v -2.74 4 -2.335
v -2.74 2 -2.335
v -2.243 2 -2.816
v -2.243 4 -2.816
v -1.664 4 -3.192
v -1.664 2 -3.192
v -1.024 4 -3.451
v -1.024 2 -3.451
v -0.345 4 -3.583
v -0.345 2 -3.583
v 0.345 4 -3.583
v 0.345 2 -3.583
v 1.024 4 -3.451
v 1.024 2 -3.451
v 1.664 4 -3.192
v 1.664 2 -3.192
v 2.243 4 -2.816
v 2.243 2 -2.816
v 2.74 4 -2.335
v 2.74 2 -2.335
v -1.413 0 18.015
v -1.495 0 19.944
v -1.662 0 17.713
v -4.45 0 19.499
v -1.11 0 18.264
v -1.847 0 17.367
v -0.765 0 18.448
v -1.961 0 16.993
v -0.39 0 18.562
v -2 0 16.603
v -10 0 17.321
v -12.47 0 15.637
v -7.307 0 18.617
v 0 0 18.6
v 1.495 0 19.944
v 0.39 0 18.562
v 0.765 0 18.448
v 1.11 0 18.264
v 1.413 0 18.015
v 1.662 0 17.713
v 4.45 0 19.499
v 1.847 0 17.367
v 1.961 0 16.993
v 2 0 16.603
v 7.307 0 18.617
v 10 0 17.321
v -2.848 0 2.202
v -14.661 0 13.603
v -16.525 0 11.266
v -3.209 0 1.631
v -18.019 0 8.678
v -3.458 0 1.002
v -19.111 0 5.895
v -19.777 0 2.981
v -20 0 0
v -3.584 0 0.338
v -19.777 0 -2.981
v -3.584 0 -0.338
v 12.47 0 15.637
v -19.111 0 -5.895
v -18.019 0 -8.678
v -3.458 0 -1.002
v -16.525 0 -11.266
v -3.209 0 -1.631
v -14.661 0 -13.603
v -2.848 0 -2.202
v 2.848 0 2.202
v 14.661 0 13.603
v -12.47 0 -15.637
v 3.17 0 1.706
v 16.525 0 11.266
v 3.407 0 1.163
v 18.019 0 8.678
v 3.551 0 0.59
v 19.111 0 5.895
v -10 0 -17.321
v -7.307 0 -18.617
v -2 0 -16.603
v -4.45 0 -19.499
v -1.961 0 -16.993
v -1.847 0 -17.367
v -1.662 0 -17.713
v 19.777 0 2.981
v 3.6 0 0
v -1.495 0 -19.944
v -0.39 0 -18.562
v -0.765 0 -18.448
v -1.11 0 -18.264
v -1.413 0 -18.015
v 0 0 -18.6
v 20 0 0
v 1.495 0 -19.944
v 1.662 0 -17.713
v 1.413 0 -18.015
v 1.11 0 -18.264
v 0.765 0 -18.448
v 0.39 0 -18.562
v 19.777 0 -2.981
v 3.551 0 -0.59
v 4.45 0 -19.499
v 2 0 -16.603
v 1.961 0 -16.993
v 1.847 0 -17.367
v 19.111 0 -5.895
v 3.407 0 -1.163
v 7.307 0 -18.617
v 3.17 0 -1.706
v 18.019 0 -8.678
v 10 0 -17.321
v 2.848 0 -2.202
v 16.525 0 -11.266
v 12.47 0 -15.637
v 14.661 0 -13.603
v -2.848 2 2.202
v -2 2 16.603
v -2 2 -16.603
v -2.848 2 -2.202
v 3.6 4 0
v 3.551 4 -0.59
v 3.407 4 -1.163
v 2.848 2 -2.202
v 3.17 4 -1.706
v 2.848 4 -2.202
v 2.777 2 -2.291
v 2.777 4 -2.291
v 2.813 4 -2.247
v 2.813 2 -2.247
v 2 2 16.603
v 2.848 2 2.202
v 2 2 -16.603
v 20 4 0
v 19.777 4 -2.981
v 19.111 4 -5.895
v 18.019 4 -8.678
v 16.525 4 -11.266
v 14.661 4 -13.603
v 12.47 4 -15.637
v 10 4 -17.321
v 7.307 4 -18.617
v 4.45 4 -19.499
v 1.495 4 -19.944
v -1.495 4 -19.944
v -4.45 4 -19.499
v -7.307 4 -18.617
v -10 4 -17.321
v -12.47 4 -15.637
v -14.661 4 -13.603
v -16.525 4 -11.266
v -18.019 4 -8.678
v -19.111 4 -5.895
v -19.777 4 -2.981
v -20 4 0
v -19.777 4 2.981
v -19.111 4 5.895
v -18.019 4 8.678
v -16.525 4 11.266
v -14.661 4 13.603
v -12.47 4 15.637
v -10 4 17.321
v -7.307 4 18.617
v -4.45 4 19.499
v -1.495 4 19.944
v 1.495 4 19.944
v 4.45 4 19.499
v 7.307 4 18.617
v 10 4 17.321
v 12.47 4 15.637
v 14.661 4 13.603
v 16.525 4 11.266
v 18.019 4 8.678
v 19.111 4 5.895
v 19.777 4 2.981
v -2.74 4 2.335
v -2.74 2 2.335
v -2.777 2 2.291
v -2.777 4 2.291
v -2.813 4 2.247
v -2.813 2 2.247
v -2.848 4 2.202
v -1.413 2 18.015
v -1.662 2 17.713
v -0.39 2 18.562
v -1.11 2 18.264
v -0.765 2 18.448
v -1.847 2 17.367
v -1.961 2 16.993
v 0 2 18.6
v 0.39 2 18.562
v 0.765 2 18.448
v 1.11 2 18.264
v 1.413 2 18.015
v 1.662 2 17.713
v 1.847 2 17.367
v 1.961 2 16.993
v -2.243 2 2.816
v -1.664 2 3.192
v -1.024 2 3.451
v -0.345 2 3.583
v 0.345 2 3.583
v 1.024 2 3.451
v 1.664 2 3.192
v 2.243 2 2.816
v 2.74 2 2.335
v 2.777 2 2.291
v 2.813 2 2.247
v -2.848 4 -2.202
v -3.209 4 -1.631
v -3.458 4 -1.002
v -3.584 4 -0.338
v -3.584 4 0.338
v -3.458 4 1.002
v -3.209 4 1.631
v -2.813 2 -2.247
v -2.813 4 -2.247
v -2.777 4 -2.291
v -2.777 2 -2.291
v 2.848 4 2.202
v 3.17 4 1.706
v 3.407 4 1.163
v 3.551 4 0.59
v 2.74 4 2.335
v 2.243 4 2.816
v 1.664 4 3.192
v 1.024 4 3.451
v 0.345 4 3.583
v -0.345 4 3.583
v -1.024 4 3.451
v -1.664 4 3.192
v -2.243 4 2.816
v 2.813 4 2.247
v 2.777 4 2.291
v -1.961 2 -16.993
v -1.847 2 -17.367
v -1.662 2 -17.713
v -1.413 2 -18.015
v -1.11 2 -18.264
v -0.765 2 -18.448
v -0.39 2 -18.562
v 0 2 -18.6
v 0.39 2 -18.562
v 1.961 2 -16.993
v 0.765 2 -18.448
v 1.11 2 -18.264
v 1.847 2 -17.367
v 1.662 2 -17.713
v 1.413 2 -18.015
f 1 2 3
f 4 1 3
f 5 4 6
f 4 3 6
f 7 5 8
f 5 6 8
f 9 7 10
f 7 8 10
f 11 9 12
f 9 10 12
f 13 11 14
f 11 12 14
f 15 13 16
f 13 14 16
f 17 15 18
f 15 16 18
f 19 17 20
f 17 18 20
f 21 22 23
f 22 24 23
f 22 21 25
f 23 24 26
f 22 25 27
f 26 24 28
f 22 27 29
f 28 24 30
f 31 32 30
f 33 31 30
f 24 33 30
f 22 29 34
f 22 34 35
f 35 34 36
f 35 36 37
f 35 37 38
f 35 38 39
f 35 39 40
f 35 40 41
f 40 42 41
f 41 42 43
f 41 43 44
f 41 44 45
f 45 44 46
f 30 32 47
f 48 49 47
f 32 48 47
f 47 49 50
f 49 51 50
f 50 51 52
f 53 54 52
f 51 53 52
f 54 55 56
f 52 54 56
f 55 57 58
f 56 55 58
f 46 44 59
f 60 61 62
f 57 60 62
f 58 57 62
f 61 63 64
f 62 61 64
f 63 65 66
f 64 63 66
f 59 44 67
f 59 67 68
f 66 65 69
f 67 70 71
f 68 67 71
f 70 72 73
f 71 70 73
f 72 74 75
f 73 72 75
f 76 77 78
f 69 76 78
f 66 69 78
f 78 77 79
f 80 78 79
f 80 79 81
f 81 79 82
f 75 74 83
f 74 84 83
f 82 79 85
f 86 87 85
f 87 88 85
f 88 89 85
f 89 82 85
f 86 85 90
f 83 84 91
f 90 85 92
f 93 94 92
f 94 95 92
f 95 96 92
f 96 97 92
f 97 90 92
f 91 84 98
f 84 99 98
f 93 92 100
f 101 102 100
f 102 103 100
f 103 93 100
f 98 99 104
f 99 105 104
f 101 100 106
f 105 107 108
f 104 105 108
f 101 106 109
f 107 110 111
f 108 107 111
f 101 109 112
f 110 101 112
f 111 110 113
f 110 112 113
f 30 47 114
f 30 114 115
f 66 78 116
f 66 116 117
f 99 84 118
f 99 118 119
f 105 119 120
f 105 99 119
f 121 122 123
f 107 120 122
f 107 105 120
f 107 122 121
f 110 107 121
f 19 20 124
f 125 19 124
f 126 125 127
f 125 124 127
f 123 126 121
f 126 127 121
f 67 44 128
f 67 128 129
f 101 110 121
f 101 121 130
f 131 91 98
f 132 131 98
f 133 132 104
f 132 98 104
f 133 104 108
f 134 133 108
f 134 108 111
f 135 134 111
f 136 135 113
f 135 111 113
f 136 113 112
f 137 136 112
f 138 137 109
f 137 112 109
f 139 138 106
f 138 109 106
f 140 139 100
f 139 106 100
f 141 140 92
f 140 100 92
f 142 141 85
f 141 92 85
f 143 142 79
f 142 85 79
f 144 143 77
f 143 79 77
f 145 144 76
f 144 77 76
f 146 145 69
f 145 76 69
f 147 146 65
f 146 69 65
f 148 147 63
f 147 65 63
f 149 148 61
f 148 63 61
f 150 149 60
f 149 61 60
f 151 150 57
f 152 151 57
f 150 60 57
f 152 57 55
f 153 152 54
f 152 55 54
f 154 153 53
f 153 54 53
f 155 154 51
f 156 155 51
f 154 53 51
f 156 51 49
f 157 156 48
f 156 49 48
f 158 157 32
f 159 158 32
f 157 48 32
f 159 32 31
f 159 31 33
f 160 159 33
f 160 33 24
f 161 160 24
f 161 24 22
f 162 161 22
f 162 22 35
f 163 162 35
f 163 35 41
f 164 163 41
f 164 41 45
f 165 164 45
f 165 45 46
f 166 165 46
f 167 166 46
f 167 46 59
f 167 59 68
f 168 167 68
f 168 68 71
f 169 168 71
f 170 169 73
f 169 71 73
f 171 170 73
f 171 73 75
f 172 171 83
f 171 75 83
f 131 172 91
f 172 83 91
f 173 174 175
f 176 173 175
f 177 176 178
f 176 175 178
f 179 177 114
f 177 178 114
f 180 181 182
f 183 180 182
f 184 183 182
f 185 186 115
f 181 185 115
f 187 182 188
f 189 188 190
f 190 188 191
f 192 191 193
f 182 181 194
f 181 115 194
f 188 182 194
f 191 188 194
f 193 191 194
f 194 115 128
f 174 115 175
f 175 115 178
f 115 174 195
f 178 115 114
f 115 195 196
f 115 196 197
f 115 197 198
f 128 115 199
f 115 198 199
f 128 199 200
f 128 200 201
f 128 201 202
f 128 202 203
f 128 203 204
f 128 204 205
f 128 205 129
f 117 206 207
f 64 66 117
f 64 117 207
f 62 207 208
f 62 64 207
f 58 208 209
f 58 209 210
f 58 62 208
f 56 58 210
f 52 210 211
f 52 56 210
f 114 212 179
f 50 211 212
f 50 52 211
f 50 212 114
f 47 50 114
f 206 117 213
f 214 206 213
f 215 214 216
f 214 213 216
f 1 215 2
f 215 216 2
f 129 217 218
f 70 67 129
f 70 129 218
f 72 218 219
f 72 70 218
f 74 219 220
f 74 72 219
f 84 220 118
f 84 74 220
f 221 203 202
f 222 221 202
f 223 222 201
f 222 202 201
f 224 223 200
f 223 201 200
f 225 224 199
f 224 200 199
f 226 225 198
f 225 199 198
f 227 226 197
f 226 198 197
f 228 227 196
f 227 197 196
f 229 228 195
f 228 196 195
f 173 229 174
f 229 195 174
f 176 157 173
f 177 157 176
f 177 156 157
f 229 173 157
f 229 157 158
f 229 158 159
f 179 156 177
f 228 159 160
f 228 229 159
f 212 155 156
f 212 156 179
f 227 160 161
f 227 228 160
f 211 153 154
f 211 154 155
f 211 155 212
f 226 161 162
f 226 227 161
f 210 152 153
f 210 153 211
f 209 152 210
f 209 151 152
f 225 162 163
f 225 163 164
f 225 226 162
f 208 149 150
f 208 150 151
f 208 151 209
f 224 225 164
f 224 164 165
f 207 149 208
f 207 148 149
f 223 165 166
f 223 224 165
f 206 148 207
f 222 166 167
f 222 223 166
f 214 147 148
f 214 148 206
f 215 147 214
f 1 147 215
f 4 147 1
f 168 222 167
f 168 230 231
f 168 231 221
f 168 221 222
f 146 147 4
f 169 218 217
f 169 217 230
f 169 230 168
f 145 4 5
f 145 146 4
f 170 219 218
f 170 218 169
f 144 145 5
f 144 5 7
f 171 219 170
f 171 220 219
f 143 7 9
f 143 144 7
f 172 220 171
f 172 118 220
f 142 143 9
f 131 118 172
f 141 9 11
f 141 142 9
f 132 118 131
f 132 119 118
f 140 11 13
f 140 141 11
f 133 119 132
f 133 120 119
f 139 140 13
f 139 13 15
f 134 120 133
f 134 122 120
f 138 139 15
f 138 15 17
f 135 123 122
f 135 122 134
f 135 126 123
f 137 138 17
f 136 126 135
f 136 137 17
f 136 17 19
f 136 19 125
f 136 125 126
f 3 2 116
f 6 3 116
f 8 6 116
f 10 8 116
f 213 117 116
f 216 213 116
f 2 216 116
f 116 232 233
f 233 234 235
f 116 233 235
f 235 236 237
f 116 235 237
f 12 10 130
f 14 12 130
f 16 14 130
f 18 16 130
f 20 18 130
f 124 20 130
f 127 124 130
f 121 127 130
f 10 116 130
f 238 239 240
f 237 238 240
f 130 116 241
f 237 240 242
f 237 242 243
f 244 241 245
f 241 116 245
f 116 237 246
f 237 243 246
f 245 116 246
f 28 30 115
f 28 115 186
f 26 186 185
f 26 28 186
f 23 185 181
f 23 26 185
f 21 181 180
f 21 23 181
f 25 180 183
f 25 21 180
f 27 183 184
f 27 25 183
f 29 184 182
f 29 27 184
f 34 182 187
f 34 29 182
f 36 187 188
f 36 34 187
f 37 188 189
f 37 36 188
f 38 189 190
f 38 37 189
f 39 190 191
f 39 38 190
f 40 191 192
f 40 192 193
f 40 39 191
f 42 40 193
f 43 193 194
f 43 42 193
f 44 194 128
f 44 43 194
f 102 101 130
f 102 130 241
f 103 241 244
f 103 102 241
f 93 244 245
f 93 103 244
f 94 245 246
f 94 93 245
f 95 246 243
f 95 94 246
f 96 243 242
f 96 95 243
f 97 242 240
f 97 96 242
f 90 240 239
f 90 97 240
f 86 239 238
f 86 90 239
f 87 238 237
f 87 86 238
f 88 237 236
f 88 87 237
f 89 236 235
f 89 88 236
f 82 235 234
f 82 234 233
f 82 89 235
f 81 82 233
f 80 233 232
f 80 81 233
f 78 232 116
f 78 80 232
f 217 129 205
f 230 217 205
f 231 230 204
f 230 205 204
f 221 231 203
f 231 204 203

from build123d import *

# Parameters (mm, degrees)
SKETCH1_R           = 20
SKETCH1_R_2         = 3.6
BOSS_EXTRUDE2_DEPTH = 4
CUT_EXTRUDE2_DEPTH  = 2


with BuildPart() as part:
    # Sketch1 → Boss-Extrude2 (new body)
    with BuildSketch(Plane(origin=(0, 0, 0), x_dir=(1, 0, 0), z_dir=(0, 1, 0))):
        Circle(SKETCH1_R)
        Circle(SKETCH1_R_2, mode=Mode.SUBTRACT)
    extrude(amount=BOSS_EXTRUDE2_DEPTH)

    # Sketch1<6> → Cut-Extrude2 (cut)
    with BuildSketch(Plane(origin=(0, 0, 0), x_dir=(1, 0, 0), z_dir=(0, 1, 0))):
        with BuildLine():
            Line((-2.847996741, -2.202025105), (-1.999997781, -16.602979385))
            ThreePointArc((-1.999997781, -16.602979385), (0, -18.6), (1.999997781, -16.602979385))
            Line((1.999997781, -16.602979385), (2.847996741, -2.202025105))
            ThreePointArc((2.847996741, -2.202025105), (0, -3.6), (-2.847996741, -2.202025105))
        make_face()
        with BuildLine():
            ThreePointArc((-2.847996741, 2.202025105), (0, 3.6), (2.847996741, 2.202025105))
            Line((2.847996741, 2.202025105), (1.999997781, 16.602979385))
            ThreePointArc((1.999997781, 16.602979385), (0, 18.6), (-1.999997781, 16.602979385))
            Line((-1.999997781, 16.602979385), (-2.847996741, 2.202025105))
        make_face()
    extrude(amount=CUT_EXTRUDE2_DEPTH, mode=Mode.SUBTRACT)


solid = part.part
